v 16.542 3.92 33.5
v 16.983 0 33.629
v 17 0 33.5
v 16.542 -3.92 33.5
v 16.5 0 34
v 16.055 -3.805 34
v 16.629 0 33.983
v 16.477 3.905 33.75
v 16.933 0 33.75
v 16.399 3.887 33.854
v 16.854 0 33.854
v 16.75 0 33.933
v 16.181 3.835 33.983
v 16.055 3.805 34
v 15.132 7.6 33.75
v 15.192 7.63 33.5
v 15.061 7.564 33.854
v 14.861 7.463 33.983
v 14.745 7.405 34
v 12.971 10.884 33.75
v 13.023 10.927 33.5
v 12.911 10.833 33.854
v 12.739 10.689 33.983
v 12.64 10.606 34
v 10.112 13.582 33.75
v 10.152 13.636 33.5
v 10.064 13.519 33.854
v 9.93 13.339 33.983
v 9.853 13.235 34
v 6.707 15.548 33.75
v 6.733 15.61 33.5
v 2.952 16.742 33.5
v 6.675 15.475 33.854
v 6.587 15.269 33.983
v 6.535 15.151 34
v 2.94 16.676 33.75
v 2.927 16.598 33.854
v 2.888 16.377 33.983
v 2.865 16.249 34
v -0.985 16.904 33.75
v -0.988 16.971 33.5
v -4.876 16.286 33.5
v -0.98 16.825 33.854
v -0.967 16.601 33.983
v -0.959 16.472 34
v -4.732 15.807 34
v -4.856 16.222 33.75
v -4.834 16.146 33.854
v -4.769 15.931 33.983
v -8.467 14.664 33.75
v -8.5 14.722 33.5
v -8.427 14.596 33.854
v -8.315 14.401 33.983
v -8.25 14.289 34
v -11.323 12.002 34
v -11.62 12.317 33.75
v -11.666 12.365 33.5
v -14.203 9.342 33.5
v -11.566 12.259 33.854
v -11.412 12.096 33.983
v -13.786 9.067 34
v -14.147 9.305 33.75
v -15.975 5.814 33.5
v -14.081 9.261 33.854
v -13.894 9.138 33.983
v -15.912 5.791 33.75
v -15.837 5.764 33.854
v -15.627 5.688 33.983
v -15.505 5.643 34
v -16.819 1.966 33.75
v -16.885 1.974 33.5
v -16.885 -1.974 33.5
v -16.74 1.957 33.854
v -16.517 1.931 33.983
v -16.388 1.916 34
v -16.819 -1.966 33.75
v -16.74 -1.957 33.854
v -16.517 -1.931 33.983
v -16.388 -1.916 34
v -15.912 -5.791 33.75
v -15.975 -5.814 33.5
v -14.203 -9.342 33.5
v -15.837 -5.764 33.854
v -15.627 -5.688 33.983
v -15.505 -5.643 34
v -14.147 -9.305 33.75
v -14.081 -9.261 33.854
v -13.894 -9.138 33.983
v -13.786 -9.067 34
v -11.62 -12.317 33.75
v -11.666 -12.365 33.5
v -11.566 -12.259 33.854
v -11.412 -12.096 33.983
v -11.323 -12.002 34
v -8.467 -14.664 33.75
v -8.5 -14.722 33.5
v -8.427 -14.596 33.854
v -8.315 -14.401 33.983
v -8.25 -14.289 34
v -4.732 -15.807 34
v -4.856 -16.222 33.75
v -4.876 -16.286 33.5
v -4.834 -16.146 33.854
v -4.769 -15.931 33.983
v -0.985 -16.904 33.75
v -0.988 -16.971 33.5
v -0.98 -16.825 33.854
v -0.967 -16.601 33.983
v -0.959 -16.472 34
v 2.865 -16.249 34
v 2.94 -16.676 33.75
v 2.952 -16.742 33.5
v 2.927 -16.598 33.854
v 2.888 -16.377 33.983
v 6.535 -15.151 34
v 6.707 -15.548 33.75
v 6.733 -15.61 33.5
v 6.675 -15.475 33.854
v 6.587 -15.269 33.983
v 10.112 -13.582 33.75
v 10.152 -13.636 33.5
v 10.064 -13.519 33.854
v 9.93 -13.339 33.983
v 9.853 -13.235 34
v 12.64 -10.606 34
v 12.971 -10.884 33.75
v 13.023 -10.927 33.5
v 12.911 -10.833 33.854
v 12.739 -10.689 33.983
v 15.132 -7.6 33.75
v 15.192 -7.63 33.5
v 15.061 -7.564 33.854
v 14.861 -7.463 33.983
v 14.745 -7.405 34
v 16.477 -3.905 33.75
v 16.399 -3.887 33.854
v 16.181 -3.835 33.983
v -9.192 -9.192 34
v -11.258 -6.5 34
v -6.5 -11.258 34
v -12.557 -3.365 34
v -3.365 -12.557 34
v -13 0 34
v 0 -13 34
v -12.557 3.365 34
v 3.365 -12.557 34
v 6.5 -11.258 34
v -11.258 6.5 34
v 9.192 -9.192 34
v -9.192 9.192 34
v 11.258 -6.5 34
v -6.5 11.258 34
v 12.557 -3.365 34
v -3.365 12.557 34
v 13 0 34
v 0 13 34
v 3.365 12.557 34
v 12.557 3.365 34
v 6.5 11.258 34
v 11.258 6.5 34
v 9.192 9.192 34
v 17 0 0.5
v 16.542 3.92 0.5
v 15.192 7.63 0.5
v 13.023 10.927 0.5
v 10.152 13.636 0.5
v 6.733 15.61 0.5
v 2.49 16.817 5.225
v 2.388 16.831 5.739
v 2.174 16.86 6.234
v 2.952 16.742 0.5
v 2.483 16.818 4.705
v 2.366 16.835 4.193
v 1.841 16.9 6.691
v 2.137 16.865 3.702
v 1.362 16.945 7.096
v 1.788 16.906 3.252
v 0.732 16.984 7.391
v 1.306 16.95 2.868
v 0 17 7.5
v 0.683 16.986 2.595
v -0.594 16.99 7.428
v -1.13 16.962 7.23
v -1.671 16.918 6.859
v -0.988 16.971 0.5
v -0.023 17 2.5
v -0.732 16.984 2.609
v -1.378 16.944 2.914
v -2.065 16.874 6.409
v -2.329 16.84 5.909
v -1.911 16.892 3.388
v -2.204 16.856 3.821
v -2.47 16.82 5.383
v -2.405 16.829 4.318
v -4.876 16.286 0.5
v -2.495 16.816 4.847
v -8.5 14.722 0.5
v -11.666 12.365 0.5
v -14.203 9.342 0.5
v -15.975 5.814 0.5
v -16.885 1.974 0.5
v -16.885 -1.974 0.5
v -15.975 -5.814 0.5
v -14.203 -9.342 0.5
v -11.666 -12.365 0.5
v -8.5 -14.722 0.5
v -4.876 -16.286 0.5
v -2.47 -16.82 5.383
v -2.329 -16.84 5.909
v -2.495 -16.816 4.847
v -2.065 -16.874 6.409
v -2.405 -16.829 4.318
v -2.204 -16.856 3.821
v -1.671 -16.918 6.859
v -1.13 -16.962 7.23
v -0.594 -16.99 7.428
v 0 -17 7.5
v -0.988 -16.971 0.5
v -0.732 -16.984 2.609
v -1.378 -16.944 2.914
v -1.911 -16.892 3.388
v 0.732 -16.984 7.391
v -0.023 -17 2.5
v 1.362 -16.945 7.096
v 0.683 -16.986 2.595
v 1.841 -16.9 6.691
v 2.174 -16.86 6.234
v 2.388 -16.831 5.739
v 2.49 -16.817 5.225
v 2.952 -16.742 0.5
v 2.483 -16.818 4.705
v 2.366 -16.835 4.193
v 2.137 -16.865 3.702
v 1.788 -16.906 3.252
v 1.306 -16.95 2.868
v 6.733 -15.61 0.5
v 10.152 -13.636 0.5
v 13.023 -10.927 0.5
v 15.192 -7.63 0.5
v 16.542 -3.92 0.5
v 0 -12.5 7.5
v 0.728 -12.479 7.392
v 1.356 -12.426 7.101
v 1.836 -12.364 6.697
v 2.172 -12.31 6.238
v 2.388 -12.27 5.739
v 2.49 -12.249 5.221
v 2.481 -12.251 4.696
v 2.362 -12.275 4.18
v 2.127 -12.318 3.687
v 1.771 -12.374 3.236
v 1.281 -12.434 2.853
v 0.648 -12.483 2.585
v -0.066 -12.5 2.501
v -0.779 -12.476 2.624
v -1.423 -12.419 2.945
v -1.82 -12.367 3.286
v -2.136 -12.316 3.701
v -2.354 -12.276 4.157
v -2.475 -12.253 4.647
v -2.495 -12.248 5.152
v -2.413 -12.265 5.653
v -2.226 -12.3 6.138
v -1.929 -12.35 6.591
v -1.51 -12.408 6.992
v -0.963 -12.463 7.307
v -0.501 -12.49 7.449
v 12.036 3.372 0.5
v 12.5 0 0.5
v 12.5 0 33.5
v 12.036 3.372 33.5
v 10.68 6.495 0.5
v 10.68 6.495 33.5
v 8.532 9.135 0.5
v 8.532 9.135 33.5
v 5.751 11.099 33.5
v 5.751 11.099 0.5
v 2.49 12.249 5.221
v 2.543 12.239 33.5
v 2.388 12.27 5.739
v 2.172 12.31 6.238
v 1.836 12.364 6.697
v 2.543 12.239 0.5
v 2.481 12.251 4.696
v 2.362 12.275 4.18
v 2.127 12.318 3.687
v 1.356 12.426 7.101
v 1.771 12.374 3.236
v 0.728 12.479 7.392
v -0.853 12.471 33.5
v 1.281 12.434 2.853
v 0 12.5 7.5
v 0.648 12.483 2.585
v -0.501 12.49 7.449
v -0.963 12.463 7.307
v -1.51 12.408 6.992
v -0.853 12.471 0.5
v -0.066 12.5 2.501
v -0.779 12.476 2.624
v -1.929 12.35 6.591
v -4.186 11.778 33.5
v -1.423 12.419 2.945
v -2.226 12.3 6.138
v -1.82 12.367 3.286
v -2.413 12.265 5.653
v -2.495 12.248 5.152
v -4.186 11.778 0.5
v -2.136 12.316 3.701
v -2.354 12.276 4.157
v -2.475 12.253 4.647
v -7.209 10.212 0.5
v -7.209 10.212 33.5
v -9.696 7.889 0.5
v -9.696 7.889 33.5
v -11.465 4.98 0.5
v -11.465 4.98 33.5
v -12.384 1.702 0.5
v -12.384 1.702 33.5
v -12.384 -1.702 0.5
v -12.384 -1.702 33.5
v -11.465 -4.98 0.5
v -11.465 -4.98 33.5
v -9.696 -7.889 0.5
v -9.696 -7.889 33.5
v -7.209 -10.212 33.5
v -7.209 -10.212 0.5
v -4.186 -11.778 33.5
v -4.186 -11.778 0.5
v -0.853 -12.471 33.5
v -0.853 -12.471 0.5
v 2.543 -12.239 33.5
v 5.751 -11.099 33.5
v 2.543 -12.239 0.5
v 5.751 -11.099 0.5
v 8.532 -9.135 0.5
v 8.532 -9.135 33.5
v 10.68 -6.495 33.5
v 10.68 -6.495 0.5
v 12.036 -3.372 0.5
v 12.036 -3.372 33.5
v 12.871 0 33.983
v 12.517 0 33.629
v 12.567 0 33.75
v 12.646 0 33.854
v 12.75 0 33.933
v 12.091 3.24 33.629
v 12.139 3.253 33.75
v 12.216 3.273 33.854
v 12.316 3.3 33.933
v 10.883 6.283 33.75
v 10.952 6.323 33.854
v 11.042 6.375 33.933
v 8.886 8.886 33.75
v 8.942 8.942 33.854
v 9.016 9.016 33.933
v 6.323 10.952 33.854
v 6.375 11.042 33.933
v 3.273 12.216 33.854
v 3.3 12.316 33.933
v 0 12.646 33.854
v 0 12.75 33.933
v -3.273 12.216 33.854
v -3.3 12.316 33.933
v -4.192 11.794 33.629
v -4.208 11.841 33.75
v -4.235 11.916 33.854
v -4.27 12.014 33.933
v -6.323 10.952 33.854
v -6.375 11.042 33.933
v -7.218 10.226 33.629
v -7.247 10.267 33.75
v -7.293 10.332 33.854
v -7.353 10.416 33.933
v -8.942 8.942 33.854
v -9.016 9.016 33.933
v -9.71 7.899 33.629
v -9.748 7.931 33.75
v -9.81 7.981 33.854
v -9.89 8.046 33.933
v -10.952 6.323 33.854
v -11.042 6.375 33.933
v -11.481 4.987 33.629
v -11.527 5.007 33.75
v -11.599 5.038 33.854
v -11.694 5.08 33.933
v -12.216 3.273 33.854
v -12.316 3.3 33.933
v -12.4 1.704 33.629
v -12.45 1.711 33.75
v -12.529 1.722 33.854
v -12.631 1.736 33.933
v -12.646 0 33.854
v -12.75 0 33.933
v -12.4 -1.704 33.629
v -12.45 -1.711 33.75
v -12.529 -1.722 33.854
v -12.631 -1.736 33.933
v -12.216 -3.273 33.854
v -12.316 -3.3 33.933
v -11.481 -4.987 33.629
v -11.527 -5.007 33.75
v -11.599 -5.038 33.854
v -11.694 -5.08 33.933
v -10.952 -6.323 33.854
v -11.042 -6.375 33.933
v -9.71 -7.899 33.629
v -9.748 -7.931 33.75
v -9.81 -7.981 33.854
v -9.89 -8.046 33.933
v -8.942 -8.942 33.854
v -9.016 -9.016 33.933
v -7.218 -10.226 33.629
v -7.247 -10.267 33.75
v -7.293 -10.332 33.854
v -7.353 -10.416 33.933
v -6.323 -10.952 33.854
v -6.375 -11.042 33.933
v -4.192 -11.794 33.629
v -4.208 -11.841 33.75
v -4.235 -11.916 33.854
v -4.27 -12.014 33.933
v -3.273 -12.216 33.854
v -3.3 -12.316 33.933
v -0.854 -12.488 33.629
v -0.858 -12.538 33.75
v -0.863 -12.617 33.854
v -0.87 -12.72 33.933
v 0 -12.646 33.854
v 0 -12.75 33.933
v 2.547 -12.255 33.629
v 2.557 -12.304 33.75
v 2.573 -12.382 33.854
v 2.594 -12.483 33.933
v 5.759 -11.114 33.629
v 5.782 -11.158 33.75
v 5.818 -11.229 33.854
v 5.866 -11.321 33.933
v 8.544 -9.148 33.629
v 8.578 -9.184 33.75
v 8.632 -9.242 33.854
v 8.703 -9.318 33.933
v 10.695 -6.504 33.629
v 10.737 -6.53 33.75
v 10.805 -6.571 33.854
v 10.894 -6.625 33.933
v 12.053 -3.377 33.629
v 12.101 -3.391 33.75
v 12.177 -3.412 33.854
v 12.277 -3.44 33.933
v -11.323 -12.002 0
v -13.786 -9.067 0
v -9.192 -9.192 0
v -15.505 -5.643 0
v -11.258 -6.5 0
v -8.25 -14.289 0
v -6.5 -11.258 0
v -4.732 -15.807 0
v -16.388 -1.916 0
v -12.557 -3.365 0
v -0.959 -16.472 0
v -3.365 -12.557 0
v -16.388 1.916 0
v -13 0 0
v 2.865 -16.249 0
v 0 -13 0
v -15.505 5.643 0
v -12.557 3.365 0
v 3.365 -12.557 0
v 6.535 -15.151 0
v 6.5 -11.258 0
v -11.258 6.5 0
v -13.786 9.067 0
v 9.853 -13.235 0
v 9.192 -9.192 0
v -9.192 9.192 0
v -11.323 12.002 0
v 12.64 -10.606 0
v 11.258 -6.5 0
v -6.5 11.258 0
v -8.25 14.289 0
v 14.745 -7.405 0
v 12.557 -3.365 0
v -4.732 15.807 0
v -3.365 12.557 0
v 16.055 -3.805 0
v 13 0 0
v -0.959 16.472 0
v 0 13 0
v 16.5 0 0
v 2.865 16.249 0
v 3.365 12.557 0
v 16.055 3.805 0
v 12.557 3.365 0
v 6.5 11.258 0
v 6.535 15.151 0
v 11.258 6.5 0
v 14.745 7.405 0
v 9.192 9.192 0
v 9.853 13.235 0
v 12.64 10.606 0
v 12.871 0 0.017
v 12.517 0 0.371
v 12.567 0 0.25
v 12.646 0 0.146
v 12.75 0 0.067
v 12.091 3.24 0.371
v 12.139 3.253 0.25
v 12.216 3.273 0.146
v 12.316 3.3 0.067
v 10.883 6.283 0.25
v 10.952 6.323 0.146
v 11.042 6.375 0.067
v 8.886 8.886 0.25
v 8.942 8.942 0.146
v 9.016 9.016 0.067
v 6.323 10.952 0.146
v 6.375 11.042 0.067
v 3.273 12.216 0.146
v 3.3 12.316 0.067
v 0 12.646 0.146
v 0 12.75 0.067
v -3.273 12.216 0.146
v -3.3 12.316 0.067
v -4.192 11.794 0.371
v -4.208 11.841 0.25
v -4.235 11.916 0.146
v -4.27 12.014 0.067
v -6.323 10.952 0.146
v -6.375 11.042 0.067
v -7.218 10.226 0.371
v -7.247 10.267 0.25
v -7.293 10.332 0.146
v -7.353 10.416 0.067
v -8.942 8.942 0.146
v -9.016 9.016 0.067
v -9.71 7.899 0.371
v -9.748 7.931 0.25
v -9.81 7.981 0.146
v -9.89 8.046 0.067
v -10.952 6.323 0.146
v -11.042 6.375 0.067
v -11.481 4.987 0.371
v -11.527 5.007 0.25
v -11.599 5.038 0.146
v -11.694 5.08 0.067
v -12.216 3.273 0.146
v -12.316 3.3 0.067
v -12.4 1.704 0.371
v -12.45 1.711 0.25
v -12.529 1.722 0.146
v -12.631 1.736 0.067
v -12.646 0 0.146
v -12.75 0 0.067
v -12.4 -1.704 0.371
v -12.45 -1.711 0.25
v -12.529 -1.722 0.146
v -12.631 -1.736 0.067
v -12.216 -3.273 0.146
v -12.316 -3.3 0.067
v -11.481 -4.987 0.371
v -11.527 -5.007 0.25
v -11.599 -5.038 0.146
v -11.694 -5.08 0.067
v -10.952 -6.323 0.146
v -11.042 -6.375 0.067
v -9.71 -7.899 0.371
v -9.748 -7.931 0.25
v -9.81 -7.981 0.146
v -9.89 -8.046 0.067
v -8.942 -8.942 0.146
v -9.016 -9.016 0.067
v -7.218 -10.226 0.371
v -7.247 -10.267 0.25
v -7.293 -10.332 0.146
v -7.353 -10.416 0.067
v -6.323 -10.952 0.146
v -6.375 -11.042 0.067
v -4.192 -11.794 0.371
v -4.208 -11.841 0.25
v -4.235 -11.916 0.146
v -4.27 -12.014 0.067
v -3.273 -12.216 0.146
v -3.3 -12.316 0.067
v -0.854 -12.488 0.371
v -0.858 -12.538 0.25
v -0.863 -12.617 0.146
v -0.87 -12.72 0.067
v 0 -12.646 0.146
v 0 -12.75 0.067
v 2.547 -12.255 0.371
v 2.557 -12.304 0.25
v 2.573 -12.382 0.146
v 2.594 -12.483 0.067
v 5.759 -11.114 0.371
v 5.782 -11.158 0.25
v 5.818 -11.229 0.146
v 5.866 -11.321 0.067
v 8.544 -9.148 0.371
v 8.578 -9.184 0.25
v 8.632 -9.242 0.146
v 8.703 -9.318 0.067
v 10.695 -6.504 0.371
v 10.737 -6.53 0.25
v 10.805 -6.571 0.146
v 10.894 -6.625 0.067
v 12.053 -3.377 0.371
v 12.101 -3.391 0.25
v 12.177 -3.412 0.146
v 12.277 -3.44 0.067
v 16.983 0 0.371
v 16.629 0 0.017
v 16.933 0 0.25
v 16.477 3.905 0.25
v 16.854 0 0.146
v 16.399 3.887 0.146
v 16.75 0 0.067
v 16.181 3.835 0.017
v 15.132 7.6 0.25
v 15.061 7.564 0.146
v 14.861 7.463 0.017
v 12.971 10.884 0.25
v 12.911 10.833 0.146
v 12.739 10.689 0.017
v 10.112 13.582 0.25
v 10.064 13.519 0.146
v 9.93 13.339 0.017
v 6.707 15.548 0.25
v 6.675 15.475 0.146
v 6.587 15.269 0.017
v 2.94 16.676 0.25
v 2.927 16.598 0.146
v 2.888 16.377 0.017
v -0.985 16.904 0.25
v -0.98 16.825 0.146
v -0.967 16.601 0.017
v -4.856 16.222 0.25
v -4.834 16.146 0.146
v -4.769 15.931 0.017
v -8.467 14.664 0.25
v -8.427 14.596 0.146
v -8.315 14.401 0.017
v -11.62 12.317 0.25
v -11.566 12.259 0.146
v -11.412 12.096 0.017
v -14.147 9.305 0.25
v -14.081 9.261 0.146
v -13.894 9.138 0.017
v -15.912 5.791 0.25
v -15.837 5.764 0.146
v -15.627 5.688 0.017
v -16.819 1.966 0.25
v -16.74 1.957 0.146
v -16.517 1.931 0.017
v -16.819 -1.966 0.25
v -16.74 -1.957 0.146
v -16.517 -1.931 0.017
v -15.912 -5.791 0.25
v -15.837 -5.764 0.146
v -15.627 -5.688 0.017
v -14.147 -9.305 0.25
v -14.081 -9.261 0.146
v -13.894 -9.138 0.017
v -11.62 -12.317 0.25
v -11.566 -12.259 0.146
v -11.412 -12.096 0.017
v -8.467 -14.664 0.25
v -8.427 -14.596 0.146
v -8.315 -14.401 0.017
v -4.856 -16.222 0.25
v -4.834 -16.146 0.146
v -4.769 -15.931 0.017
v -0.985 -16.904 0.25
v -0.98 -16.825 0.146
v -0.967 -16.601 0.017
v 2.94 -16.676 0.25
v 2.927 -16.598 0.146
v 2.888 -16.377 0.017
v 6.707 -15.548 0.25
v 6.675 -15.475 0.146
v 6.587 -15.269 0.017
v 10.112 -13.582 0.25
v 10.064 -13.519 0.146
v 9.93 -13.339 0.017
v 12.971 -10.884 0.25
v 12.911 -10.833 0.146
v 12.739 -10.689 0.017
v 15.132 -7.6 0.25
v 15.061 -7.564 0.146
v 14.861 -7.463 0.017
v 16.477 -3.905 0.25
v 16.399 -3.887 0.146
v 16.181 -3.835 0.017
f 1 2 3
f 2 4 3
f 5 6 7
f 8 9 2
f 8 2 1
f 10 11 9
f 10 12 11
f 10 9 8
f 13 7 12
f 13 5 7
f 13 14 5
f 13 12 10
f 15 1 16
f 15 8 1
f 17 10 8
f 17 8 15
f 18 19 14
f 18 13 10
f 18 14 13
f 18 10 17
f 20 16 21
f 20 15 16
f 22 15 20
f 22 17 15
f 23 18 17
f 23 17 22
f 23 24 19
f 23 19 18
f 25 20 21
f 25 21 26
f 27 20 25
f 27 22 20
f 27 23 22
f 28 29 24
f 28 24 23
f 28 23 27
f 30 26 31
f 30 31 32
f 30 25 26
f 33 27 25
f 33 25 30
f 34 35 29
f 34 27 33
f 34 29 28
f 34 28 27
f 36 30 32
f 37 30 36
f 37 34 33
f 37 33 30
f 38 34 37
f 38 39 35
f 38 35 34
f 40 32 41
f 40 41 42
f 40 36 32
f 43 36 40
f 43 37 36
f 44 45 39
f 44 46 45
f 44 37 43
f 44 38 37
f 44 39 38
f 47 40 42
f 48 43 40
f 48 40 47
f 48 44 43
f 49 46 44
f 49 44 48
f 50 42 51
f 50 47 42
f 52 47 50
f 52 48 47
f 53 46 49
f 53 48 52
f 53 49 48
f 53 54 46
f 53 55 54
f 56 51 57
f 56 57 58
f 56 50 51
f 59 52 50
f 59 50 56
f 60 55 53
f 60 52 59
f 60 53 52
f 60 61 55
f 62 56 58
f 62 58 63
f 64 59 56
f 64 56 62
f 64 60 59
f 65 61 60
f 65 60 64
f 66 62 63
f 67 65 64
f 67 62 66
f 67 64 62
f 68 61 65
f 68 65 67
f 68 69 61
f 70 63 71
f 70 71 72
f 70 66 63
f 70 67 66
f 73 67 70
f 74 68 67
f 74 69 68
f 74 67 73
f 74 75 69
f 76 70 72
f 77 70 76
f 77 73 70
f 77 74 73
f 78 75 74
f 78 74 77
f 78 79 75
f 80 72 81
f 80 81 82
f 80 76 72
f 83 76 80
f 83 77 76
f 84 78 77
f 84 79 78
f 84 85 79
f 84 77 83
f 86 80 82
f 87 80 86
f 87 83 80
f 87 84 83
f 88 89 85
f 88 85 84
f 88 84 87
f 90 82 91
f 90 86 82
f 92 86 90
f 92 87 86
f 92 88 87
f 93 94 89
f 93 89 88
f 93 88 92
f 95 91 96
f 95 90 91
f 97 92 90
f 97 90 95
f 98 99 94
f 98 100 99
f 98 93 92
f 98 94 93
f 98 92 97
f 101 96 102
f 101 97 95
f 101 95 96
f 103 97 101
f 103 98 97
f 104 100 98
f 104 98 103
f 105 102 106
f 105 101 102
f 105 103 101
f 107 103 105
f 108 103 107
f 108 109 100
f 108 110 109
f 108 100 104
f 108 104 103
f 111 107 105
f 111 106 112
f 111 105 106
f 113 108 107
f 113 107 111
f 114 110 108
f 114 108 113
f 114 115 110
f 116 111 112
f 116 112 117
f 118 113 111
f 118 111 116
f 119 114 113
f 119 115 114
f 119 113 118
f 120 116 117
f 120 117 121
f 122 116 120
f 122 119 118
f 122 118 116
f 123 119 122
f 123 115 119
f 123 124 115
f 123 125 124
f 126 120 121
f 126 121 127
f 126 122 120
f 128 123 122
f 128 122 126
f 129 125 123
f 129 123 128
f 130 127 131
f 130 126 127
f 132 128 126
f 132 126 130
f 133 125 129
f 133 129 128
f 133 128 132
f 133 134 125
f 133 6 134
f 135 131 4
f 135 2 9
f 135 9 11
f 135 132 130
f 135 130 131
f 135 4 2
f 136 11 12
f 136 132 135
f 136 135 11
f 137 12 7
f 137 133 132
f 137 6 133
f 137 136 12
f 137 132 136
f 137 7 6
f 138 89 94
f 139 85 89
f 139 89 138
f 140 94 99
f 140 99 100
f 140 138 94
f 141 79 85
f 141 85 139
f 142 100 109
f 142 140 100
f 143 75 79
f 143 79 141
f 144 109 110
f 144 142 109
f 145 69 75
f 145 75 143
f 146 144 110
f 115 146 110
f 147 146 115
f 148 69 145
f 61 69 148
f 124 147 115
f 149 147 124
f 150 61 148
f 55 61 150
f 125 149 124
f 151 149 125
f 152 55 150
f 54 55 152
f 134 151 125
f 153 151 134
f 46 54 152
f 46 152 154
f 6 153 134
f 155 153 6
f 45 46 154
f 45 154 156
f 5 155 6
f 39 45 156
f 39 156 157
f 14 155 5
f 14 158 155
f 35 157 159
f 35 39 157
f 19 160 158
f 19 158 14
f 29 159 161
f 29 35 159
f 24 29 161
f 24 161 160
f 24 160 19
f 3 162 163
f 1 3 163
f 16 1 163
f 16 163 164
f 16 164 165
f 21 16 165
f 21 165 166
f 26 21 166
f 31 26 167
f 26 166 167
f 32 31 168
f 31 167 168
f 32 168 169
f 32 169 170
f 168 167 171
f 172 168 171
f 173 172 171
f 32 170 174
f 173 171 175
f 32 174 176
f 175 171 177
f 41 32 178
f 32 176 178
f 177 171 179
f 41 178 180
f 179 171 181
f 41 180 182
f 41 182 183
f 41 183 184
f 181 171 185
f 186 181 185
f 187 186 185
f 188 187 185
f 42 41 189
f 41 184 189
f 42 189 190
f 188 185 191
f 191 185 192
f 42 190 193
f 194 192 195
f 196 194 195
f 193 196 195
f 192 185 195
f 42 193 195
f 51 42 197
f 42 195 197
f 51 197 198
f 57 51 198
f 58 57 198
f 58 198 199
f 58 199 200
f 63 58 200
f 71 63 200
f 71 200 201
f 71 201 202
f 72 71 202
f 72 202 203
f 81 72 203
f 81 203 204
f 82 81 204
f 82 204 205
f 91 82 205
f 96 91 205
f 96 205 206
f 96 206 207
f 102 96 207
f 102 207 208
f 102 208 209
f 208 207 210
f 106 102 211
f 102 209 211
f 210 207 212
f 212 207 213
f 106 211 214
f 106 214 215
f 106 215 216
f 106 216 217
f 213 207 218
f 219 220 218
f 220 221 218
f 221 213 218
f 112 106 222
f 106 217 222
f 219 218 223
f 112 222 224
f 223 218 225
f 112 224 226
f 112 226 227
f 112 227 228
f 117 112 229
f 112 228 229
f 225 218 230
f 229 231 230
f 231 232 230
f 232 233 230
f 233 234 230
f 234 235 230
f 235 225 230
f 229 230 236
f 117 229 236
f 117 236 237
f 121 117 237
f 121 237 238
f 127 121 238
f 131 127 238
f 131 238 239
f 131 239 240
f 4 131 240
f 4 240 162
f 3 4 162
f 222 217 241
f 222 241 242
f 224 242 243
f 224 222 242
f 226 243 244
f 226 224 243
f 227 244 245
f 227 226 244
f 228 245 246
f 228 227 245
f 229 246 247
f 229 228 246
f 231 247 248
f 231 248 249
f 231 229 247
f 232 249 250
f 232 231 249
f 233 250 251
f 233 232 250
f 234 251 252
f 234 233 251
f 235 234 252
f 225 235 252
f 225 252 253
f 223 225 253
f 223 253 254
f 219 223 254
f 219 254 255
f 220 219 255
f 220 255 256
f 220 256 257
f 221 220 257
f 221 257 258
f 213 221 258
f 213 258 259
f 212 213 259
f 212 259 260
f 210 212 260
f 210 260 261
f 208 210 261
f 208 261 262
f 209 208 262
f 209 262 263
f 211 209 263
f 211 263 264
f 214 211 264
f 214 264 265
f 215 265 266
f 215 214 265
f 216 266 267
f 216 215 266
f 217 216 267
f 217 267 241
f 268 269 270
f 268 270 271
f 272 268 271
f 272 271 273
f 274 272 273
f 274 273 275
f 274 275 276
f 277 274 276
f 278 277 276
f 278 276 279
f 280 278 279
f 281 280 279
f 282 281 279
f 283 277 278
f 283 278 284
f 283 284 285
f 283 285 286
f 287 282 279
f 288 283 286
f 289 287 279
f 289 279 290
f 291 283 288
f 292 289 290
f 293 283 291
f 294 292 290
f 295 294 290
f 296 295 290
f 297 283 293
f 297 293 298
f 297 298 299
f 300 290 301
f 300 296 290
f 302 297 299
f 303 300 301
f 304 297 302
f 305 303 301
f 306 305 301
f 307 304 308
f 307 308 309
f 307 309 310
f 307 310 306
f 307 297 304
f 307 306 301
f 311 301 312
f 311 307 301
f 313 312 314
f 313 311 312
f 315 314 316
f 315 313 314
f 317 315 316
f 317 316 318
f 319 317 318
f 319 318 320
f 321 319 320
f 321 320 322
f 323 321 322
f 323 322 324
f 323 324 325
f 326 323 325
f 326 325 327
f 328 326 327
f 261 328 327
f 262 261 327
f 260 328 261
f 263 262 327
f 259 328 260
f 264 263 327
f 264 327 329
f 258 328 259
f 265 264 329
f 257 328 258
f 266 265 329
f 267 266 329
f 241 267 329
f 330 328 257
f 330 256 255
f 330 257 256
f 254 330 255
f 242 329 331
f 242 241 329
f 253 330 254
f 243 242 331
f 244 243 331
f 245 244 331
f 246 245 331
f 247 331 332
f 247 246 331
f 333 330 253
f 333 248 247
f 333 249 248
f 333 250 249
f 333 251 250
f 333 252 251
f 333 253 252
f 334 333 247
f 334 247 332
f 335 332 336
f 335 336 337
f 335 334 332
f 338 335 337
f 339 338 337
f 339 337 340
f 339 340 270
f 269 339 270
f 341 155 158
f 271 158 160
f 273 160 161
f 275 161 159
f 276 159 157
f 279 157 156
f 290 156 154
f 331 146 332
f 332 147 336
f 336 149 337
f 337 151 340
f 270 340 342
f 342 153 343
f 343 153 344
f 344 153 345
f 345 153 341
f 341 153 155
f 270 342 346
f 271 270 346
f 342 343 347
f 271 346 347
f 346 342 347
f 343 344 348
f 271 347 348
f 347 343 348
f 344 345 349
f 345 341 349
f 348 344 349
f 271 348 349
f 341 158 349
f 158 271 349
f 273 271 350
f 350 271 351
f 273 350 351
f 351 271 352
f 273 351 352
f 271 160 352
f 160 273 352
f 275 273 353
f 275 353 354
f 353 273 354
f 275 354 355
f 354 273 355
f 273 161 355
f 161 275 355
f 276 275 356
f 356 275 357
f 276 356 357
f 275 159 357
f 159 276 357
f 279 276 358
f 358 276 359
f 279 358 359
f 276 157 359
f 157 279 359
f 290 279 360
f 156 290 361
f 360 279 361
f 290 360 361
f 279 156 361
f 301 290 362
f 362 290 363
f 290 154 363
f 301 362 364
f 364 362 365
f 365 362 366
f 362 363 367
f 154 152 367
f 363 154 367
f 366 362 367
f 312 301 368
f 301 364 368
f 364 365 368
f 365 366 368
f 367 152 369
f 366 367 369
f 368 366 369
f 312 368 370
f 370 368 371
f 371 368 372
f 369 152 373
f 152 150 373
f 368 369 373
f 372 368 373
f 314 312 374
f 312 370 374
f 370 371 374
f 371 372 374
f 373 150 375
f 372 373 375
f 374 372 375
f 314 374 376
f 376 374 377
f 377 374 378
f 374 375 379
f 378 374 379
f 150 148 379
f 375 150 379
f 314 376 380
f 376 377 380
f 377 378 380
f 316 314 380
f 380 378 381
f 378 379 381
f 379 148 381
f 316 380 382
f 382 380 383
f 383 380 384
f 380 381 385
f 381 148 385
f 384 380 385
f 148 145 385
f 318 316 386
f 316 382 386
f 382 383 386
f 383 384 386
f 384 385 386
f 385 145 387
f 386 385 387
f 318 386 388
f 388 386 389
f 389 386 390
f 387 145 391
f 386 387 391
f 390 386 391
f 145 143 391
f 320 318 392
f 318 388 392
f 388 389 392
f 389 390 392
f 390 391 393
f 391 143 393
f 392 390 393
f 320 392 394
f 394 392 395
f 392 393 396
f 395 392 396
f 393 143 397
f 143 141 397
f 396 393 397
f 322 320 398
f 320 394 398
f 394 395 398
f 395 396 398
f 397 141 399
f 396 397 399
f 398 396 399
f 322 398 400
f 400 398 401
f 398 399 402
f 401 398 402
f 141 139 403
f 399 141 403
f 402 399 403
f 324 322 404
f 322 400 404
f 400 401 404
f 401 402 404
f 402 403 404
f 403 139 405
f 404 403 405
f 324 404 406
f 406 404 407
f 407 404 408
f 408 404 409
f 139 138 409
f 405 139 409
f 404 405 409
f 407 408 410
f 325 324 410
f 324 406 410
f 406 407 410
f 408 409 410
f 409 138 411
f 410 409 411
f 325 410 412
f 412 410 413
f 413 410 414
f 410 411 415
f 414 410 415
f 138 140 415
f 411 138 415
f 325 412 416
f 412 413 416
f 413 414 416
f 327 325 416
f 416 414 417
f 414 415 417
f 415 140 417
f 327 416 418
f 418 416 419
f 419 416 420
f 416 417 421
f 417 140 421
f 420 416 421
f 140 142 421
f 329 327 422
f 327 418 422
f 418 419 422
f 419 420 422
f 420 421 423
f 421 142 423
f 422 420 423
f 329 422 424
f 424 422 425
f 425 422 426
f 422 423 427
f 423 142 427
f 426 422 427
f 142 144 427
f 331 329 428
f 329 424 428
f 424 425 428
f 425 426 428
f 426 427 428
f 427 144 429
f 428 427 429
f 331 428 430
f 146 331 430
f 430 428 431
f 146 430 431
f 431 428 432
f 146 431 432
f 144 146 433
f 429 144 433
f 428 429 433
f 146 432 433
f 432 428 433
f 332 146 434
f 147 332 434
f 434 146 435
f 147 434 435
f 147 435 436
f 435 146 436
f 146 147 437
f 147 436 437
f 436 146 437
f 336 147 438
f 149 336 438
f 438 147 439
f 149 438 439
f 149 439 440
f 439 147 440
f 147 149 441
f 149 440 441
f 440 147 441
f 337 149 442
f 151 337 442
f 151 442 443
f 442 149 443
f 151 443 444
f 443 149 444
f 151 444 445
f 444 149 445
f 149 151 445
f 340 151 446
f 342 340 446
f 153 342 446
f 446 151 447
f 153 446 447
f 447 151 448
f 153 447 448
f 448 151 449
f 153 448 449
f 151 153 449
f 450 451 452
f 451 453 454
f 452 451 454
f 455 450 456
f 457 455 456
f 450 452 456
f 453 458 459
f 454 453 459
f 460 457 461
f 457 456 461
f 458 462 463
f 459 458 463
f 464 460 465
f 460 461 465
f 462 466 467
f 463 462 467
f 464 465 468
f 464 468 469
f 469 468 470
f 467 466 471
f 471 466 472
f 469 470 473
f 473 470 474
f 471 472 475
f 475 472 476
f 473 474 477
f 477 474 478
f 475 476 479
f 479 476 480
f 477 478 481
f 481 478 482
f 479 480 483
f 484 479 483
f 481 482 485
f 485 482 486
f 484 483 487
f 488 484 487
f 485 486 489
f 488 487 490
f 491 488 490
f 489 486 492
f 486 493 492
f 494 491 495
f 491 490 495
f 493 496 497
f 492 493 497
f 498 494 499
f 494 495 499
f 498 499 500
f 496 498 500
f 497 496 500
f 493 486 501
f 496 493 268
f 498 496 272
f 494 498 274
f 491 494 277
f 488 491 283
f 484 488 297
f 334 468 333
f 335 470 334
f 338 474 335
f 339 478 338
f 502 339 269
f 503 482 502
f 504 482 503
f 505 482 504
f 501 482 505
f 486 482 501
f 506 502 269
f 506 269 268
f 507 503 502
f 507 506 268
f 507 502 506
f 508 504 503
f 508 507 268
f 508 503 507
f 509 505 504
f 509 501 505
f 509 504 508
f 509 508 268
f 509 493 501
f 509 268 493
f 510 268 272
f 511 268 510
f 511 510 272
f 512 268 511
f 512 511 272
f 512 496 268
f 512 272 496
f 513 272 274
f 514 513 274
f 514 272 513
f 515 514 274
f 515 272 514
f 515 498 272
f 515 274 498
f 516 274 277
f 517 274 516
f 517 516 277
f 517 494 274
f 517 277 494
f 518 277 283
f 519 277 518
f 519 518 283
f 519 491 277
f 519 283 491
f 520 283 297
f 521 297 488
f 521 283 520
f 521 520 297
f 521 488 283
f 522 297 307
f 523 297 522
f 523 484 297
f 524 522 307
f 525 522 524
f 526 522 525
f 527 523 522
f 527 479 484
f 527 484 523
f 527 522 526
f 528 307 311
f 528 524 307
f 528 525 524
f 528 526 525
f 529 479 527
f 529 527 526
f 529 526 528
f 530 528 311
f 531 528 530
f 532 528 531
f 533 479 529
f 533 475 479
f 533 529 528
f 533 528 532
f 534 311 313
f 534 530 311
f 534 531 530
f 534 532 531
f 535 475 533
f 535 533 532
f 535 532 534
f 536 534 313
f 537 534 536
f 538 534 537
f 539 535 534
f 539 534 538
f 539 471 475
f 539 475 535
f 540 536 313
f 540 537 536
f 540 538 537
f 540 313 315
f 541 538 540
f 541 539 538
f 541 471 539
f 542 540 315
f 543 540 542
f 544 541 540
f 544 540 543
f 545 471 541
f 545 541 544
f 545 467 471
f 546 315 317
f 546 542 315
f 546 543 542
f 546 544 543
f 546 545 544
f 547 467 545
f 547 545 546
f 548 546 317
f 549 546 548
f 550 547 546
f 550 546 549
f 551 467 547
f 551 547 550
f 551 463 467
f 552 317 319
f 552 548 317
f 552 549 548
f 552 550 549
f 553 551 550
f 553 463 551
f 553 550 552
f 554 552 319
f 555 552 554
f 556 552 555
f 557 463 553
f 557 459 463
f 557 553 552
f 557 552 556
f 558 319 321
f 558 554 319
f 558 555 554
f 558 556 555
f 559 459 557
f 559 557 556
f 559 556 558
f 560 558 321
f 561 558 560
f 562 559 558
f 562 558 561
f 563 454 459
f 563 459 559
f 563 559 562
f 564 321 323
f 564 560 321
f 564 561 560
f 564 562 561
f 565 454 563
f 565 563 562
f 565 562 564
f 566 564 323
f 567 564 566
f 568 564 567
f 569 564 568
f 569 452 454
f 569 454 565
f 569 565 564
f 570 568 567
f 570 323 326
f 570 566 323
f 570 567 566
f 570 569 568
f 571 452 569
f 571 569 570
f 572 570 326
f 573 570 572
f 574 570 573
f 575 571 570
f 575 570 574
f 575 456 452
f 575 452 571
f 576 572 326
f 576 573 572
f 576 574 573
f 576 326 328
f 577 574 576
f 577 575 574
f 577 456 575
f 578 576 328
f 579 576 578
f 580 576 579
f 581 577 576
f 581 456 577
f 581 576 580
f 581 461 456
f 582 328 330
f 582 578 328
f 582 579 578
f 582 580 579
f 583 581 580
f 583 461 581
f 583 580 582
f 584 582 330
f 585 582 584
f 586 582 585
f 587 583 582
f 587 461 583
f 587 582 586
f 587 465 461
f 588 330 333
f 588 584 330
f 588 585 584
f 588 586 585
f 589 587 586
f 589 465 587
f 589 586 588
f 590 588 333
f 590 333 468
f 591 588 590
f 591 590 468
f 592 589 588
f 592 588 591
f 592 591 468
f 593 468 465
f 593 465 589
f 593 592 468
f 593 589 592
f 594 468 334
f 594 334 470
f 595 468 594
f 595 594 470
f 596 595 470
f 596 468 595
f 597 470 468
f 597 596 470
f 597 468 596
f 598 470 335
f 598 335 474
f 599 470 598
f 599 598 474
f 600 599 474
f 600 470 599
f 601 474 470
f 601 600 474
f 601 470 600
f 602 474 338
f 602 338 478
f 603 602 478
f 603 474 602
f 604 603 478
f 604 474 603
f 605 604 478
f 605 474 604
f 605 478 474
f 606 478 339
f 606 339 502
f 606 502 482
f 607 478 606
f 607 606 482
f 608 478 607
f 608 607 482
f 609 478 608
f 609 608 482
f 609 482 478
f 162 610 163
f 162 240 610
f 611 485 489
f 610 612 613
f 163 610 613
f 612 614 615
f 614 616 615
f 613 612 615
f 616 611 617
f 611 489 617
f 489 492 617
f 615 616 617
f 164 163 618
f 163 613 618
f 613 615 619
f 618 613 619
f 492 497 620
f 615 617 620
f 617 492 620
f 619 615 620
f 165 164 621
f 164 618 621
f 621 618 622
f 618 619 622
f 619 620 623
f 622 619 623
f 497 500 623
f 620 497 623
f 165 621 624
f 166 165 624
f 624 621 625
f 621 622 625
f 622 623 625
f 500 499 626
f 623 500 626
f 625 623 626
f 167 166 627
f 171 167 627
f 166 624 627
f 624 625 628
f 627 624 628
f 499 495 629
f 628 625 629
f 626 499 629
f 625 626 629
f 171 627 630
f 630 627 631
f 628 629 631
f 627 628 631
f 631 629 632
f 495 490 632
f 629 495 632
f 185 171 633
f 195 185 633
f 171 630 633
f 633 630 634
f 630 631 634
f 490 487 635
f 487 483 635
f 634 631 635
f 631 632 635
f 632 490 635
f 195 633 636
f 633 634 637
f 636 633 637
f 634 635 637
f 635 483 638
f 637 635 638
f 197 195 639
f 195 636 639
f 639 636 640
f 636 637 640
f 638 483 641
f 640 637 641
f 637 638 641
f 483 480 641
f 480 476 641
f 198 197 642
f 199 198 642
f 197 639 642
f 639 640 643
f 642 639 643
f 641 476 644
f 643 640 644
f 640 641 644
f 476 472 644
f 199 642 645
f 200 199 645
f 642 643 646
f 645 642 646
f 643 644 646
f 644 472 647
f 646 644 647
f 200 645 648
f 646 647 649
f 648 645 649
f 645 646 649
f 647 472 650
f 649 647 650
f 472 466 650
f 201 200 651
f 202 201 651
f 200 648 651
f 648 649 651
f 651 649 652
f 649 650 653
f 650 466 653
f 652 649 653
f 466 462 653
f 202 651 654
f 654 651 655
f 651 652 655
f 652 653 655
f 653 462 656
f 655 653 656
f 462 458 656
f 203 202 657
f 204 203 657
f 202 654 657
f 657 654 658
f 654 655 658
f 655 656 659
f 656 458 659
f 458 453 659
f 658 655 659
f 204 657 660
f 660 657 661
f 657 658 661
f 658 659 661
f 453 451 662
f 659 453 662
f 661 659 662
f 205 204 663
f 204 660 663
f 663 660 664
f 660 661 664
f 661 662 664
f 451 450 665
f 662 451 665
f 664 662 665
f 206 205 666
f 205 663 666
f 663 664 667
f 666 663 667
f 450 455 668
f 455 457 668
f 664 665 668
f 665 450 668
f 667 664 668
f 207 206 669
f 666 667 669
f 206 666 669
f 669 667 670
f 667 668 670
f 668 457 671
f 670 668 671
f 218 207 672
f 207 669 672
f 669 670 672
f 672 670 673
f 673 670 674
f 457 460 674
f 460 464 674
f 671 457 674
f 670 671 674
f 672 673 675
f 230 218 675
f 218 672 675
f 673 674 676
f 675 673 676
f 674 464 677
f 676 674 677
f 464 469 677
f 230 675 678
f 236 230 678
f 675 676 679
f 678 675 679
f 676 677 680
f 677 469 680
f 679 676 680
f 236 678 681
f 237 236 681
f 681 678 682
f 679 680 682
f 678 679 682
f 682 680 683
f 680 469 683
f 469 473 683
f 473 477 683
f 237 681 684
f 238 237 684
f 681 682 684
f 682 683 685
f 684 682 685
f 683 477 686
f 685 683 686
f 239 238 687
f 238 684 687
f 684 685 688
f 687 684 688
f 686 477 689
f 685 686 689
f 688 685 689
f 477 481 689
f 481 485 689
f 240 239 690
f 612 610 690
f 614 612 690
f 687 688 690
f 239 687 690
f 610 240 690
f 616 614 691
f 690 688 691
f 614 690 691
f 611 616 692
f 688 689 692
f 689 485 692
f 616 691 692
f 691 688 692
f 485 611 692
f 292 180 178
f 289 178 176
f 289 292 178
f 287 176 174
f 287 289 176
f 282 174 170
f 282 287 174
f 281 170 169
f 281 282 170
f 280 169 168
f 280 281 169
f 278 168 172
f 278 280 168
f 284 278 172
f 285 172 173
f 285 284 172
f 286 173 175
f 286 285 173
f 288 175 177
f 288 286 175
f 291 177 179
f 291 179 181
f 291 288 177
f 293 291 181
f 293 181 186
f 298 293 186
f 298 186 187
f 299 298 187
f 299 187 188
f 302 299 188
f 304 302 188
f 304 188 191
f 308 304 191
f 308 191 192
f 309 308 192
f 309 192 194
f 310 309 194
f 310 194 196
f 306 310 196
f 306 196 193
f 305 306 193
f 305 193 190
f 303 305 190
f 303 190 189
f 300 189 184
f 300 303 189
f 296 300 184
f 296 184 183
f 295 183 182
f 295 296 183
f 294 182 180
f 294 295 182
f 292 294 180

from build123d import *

# Parameters (mm, degrees)
IZIM1_R                     = 17
IZIM1_R_2                   = 12.5
Y_KSEKLIK_EKSTR_ZYON1_DEPTH = 34
RADYUS1_R                   = 0.5
KES_EKSTR_ZYON1_DEPTH       = 42.641325709
KES_EKSTR_ZYON1_DEPTH_BACK  = 42.641325709
IZIM2_R                     = 2.5


with BuildPart() as part:
    # Çizim1 → Yükseklik-Ekstrüzyon1 (new body)
    with BuildSketch(Plane.XY):
        Circle(IZIM1_R)
        Circle(IZIM1_R_2, mode=Mode.SUBTRACT)
    extrude(amount=Y_KSEKLIK_EKSTR_ZYON1_DEPTH)

    # Radyus1
    radyus1_edges = [part.edges().sort_by_distance(p)[0] for p in [
        (-17, 0, 0),
        (-17, 0, 34),
        (-12.5, 0, 0),
        (-12.5, 0, 34),
    ]]
    fillet(radyus1_edges, radius=RADYUS1_R)

    # Çizim2 → Kes-Ekstrüzyon1 (cut, two sides: drawn at the far end of the back side and taken through both)
    with BuildSketch(Plane(origin=(0, 0, 0), x_dir=(1, 0, 0), z_dir=(0, 1, 0)).offset(-KES_EKSTR_ZYON1_DEPTH_BACK)):
        with Locations(Location((0, -5, 0), (0, 0, 270))):
            Circle(IZIM2_R)
    extrude(amount=KES_EKSTR_ZYON1_DEPTH + KES_EKSTR_ZYON1_DEPTH_BACK, mode=Mode.SUBTRACT)


solid = part.part
